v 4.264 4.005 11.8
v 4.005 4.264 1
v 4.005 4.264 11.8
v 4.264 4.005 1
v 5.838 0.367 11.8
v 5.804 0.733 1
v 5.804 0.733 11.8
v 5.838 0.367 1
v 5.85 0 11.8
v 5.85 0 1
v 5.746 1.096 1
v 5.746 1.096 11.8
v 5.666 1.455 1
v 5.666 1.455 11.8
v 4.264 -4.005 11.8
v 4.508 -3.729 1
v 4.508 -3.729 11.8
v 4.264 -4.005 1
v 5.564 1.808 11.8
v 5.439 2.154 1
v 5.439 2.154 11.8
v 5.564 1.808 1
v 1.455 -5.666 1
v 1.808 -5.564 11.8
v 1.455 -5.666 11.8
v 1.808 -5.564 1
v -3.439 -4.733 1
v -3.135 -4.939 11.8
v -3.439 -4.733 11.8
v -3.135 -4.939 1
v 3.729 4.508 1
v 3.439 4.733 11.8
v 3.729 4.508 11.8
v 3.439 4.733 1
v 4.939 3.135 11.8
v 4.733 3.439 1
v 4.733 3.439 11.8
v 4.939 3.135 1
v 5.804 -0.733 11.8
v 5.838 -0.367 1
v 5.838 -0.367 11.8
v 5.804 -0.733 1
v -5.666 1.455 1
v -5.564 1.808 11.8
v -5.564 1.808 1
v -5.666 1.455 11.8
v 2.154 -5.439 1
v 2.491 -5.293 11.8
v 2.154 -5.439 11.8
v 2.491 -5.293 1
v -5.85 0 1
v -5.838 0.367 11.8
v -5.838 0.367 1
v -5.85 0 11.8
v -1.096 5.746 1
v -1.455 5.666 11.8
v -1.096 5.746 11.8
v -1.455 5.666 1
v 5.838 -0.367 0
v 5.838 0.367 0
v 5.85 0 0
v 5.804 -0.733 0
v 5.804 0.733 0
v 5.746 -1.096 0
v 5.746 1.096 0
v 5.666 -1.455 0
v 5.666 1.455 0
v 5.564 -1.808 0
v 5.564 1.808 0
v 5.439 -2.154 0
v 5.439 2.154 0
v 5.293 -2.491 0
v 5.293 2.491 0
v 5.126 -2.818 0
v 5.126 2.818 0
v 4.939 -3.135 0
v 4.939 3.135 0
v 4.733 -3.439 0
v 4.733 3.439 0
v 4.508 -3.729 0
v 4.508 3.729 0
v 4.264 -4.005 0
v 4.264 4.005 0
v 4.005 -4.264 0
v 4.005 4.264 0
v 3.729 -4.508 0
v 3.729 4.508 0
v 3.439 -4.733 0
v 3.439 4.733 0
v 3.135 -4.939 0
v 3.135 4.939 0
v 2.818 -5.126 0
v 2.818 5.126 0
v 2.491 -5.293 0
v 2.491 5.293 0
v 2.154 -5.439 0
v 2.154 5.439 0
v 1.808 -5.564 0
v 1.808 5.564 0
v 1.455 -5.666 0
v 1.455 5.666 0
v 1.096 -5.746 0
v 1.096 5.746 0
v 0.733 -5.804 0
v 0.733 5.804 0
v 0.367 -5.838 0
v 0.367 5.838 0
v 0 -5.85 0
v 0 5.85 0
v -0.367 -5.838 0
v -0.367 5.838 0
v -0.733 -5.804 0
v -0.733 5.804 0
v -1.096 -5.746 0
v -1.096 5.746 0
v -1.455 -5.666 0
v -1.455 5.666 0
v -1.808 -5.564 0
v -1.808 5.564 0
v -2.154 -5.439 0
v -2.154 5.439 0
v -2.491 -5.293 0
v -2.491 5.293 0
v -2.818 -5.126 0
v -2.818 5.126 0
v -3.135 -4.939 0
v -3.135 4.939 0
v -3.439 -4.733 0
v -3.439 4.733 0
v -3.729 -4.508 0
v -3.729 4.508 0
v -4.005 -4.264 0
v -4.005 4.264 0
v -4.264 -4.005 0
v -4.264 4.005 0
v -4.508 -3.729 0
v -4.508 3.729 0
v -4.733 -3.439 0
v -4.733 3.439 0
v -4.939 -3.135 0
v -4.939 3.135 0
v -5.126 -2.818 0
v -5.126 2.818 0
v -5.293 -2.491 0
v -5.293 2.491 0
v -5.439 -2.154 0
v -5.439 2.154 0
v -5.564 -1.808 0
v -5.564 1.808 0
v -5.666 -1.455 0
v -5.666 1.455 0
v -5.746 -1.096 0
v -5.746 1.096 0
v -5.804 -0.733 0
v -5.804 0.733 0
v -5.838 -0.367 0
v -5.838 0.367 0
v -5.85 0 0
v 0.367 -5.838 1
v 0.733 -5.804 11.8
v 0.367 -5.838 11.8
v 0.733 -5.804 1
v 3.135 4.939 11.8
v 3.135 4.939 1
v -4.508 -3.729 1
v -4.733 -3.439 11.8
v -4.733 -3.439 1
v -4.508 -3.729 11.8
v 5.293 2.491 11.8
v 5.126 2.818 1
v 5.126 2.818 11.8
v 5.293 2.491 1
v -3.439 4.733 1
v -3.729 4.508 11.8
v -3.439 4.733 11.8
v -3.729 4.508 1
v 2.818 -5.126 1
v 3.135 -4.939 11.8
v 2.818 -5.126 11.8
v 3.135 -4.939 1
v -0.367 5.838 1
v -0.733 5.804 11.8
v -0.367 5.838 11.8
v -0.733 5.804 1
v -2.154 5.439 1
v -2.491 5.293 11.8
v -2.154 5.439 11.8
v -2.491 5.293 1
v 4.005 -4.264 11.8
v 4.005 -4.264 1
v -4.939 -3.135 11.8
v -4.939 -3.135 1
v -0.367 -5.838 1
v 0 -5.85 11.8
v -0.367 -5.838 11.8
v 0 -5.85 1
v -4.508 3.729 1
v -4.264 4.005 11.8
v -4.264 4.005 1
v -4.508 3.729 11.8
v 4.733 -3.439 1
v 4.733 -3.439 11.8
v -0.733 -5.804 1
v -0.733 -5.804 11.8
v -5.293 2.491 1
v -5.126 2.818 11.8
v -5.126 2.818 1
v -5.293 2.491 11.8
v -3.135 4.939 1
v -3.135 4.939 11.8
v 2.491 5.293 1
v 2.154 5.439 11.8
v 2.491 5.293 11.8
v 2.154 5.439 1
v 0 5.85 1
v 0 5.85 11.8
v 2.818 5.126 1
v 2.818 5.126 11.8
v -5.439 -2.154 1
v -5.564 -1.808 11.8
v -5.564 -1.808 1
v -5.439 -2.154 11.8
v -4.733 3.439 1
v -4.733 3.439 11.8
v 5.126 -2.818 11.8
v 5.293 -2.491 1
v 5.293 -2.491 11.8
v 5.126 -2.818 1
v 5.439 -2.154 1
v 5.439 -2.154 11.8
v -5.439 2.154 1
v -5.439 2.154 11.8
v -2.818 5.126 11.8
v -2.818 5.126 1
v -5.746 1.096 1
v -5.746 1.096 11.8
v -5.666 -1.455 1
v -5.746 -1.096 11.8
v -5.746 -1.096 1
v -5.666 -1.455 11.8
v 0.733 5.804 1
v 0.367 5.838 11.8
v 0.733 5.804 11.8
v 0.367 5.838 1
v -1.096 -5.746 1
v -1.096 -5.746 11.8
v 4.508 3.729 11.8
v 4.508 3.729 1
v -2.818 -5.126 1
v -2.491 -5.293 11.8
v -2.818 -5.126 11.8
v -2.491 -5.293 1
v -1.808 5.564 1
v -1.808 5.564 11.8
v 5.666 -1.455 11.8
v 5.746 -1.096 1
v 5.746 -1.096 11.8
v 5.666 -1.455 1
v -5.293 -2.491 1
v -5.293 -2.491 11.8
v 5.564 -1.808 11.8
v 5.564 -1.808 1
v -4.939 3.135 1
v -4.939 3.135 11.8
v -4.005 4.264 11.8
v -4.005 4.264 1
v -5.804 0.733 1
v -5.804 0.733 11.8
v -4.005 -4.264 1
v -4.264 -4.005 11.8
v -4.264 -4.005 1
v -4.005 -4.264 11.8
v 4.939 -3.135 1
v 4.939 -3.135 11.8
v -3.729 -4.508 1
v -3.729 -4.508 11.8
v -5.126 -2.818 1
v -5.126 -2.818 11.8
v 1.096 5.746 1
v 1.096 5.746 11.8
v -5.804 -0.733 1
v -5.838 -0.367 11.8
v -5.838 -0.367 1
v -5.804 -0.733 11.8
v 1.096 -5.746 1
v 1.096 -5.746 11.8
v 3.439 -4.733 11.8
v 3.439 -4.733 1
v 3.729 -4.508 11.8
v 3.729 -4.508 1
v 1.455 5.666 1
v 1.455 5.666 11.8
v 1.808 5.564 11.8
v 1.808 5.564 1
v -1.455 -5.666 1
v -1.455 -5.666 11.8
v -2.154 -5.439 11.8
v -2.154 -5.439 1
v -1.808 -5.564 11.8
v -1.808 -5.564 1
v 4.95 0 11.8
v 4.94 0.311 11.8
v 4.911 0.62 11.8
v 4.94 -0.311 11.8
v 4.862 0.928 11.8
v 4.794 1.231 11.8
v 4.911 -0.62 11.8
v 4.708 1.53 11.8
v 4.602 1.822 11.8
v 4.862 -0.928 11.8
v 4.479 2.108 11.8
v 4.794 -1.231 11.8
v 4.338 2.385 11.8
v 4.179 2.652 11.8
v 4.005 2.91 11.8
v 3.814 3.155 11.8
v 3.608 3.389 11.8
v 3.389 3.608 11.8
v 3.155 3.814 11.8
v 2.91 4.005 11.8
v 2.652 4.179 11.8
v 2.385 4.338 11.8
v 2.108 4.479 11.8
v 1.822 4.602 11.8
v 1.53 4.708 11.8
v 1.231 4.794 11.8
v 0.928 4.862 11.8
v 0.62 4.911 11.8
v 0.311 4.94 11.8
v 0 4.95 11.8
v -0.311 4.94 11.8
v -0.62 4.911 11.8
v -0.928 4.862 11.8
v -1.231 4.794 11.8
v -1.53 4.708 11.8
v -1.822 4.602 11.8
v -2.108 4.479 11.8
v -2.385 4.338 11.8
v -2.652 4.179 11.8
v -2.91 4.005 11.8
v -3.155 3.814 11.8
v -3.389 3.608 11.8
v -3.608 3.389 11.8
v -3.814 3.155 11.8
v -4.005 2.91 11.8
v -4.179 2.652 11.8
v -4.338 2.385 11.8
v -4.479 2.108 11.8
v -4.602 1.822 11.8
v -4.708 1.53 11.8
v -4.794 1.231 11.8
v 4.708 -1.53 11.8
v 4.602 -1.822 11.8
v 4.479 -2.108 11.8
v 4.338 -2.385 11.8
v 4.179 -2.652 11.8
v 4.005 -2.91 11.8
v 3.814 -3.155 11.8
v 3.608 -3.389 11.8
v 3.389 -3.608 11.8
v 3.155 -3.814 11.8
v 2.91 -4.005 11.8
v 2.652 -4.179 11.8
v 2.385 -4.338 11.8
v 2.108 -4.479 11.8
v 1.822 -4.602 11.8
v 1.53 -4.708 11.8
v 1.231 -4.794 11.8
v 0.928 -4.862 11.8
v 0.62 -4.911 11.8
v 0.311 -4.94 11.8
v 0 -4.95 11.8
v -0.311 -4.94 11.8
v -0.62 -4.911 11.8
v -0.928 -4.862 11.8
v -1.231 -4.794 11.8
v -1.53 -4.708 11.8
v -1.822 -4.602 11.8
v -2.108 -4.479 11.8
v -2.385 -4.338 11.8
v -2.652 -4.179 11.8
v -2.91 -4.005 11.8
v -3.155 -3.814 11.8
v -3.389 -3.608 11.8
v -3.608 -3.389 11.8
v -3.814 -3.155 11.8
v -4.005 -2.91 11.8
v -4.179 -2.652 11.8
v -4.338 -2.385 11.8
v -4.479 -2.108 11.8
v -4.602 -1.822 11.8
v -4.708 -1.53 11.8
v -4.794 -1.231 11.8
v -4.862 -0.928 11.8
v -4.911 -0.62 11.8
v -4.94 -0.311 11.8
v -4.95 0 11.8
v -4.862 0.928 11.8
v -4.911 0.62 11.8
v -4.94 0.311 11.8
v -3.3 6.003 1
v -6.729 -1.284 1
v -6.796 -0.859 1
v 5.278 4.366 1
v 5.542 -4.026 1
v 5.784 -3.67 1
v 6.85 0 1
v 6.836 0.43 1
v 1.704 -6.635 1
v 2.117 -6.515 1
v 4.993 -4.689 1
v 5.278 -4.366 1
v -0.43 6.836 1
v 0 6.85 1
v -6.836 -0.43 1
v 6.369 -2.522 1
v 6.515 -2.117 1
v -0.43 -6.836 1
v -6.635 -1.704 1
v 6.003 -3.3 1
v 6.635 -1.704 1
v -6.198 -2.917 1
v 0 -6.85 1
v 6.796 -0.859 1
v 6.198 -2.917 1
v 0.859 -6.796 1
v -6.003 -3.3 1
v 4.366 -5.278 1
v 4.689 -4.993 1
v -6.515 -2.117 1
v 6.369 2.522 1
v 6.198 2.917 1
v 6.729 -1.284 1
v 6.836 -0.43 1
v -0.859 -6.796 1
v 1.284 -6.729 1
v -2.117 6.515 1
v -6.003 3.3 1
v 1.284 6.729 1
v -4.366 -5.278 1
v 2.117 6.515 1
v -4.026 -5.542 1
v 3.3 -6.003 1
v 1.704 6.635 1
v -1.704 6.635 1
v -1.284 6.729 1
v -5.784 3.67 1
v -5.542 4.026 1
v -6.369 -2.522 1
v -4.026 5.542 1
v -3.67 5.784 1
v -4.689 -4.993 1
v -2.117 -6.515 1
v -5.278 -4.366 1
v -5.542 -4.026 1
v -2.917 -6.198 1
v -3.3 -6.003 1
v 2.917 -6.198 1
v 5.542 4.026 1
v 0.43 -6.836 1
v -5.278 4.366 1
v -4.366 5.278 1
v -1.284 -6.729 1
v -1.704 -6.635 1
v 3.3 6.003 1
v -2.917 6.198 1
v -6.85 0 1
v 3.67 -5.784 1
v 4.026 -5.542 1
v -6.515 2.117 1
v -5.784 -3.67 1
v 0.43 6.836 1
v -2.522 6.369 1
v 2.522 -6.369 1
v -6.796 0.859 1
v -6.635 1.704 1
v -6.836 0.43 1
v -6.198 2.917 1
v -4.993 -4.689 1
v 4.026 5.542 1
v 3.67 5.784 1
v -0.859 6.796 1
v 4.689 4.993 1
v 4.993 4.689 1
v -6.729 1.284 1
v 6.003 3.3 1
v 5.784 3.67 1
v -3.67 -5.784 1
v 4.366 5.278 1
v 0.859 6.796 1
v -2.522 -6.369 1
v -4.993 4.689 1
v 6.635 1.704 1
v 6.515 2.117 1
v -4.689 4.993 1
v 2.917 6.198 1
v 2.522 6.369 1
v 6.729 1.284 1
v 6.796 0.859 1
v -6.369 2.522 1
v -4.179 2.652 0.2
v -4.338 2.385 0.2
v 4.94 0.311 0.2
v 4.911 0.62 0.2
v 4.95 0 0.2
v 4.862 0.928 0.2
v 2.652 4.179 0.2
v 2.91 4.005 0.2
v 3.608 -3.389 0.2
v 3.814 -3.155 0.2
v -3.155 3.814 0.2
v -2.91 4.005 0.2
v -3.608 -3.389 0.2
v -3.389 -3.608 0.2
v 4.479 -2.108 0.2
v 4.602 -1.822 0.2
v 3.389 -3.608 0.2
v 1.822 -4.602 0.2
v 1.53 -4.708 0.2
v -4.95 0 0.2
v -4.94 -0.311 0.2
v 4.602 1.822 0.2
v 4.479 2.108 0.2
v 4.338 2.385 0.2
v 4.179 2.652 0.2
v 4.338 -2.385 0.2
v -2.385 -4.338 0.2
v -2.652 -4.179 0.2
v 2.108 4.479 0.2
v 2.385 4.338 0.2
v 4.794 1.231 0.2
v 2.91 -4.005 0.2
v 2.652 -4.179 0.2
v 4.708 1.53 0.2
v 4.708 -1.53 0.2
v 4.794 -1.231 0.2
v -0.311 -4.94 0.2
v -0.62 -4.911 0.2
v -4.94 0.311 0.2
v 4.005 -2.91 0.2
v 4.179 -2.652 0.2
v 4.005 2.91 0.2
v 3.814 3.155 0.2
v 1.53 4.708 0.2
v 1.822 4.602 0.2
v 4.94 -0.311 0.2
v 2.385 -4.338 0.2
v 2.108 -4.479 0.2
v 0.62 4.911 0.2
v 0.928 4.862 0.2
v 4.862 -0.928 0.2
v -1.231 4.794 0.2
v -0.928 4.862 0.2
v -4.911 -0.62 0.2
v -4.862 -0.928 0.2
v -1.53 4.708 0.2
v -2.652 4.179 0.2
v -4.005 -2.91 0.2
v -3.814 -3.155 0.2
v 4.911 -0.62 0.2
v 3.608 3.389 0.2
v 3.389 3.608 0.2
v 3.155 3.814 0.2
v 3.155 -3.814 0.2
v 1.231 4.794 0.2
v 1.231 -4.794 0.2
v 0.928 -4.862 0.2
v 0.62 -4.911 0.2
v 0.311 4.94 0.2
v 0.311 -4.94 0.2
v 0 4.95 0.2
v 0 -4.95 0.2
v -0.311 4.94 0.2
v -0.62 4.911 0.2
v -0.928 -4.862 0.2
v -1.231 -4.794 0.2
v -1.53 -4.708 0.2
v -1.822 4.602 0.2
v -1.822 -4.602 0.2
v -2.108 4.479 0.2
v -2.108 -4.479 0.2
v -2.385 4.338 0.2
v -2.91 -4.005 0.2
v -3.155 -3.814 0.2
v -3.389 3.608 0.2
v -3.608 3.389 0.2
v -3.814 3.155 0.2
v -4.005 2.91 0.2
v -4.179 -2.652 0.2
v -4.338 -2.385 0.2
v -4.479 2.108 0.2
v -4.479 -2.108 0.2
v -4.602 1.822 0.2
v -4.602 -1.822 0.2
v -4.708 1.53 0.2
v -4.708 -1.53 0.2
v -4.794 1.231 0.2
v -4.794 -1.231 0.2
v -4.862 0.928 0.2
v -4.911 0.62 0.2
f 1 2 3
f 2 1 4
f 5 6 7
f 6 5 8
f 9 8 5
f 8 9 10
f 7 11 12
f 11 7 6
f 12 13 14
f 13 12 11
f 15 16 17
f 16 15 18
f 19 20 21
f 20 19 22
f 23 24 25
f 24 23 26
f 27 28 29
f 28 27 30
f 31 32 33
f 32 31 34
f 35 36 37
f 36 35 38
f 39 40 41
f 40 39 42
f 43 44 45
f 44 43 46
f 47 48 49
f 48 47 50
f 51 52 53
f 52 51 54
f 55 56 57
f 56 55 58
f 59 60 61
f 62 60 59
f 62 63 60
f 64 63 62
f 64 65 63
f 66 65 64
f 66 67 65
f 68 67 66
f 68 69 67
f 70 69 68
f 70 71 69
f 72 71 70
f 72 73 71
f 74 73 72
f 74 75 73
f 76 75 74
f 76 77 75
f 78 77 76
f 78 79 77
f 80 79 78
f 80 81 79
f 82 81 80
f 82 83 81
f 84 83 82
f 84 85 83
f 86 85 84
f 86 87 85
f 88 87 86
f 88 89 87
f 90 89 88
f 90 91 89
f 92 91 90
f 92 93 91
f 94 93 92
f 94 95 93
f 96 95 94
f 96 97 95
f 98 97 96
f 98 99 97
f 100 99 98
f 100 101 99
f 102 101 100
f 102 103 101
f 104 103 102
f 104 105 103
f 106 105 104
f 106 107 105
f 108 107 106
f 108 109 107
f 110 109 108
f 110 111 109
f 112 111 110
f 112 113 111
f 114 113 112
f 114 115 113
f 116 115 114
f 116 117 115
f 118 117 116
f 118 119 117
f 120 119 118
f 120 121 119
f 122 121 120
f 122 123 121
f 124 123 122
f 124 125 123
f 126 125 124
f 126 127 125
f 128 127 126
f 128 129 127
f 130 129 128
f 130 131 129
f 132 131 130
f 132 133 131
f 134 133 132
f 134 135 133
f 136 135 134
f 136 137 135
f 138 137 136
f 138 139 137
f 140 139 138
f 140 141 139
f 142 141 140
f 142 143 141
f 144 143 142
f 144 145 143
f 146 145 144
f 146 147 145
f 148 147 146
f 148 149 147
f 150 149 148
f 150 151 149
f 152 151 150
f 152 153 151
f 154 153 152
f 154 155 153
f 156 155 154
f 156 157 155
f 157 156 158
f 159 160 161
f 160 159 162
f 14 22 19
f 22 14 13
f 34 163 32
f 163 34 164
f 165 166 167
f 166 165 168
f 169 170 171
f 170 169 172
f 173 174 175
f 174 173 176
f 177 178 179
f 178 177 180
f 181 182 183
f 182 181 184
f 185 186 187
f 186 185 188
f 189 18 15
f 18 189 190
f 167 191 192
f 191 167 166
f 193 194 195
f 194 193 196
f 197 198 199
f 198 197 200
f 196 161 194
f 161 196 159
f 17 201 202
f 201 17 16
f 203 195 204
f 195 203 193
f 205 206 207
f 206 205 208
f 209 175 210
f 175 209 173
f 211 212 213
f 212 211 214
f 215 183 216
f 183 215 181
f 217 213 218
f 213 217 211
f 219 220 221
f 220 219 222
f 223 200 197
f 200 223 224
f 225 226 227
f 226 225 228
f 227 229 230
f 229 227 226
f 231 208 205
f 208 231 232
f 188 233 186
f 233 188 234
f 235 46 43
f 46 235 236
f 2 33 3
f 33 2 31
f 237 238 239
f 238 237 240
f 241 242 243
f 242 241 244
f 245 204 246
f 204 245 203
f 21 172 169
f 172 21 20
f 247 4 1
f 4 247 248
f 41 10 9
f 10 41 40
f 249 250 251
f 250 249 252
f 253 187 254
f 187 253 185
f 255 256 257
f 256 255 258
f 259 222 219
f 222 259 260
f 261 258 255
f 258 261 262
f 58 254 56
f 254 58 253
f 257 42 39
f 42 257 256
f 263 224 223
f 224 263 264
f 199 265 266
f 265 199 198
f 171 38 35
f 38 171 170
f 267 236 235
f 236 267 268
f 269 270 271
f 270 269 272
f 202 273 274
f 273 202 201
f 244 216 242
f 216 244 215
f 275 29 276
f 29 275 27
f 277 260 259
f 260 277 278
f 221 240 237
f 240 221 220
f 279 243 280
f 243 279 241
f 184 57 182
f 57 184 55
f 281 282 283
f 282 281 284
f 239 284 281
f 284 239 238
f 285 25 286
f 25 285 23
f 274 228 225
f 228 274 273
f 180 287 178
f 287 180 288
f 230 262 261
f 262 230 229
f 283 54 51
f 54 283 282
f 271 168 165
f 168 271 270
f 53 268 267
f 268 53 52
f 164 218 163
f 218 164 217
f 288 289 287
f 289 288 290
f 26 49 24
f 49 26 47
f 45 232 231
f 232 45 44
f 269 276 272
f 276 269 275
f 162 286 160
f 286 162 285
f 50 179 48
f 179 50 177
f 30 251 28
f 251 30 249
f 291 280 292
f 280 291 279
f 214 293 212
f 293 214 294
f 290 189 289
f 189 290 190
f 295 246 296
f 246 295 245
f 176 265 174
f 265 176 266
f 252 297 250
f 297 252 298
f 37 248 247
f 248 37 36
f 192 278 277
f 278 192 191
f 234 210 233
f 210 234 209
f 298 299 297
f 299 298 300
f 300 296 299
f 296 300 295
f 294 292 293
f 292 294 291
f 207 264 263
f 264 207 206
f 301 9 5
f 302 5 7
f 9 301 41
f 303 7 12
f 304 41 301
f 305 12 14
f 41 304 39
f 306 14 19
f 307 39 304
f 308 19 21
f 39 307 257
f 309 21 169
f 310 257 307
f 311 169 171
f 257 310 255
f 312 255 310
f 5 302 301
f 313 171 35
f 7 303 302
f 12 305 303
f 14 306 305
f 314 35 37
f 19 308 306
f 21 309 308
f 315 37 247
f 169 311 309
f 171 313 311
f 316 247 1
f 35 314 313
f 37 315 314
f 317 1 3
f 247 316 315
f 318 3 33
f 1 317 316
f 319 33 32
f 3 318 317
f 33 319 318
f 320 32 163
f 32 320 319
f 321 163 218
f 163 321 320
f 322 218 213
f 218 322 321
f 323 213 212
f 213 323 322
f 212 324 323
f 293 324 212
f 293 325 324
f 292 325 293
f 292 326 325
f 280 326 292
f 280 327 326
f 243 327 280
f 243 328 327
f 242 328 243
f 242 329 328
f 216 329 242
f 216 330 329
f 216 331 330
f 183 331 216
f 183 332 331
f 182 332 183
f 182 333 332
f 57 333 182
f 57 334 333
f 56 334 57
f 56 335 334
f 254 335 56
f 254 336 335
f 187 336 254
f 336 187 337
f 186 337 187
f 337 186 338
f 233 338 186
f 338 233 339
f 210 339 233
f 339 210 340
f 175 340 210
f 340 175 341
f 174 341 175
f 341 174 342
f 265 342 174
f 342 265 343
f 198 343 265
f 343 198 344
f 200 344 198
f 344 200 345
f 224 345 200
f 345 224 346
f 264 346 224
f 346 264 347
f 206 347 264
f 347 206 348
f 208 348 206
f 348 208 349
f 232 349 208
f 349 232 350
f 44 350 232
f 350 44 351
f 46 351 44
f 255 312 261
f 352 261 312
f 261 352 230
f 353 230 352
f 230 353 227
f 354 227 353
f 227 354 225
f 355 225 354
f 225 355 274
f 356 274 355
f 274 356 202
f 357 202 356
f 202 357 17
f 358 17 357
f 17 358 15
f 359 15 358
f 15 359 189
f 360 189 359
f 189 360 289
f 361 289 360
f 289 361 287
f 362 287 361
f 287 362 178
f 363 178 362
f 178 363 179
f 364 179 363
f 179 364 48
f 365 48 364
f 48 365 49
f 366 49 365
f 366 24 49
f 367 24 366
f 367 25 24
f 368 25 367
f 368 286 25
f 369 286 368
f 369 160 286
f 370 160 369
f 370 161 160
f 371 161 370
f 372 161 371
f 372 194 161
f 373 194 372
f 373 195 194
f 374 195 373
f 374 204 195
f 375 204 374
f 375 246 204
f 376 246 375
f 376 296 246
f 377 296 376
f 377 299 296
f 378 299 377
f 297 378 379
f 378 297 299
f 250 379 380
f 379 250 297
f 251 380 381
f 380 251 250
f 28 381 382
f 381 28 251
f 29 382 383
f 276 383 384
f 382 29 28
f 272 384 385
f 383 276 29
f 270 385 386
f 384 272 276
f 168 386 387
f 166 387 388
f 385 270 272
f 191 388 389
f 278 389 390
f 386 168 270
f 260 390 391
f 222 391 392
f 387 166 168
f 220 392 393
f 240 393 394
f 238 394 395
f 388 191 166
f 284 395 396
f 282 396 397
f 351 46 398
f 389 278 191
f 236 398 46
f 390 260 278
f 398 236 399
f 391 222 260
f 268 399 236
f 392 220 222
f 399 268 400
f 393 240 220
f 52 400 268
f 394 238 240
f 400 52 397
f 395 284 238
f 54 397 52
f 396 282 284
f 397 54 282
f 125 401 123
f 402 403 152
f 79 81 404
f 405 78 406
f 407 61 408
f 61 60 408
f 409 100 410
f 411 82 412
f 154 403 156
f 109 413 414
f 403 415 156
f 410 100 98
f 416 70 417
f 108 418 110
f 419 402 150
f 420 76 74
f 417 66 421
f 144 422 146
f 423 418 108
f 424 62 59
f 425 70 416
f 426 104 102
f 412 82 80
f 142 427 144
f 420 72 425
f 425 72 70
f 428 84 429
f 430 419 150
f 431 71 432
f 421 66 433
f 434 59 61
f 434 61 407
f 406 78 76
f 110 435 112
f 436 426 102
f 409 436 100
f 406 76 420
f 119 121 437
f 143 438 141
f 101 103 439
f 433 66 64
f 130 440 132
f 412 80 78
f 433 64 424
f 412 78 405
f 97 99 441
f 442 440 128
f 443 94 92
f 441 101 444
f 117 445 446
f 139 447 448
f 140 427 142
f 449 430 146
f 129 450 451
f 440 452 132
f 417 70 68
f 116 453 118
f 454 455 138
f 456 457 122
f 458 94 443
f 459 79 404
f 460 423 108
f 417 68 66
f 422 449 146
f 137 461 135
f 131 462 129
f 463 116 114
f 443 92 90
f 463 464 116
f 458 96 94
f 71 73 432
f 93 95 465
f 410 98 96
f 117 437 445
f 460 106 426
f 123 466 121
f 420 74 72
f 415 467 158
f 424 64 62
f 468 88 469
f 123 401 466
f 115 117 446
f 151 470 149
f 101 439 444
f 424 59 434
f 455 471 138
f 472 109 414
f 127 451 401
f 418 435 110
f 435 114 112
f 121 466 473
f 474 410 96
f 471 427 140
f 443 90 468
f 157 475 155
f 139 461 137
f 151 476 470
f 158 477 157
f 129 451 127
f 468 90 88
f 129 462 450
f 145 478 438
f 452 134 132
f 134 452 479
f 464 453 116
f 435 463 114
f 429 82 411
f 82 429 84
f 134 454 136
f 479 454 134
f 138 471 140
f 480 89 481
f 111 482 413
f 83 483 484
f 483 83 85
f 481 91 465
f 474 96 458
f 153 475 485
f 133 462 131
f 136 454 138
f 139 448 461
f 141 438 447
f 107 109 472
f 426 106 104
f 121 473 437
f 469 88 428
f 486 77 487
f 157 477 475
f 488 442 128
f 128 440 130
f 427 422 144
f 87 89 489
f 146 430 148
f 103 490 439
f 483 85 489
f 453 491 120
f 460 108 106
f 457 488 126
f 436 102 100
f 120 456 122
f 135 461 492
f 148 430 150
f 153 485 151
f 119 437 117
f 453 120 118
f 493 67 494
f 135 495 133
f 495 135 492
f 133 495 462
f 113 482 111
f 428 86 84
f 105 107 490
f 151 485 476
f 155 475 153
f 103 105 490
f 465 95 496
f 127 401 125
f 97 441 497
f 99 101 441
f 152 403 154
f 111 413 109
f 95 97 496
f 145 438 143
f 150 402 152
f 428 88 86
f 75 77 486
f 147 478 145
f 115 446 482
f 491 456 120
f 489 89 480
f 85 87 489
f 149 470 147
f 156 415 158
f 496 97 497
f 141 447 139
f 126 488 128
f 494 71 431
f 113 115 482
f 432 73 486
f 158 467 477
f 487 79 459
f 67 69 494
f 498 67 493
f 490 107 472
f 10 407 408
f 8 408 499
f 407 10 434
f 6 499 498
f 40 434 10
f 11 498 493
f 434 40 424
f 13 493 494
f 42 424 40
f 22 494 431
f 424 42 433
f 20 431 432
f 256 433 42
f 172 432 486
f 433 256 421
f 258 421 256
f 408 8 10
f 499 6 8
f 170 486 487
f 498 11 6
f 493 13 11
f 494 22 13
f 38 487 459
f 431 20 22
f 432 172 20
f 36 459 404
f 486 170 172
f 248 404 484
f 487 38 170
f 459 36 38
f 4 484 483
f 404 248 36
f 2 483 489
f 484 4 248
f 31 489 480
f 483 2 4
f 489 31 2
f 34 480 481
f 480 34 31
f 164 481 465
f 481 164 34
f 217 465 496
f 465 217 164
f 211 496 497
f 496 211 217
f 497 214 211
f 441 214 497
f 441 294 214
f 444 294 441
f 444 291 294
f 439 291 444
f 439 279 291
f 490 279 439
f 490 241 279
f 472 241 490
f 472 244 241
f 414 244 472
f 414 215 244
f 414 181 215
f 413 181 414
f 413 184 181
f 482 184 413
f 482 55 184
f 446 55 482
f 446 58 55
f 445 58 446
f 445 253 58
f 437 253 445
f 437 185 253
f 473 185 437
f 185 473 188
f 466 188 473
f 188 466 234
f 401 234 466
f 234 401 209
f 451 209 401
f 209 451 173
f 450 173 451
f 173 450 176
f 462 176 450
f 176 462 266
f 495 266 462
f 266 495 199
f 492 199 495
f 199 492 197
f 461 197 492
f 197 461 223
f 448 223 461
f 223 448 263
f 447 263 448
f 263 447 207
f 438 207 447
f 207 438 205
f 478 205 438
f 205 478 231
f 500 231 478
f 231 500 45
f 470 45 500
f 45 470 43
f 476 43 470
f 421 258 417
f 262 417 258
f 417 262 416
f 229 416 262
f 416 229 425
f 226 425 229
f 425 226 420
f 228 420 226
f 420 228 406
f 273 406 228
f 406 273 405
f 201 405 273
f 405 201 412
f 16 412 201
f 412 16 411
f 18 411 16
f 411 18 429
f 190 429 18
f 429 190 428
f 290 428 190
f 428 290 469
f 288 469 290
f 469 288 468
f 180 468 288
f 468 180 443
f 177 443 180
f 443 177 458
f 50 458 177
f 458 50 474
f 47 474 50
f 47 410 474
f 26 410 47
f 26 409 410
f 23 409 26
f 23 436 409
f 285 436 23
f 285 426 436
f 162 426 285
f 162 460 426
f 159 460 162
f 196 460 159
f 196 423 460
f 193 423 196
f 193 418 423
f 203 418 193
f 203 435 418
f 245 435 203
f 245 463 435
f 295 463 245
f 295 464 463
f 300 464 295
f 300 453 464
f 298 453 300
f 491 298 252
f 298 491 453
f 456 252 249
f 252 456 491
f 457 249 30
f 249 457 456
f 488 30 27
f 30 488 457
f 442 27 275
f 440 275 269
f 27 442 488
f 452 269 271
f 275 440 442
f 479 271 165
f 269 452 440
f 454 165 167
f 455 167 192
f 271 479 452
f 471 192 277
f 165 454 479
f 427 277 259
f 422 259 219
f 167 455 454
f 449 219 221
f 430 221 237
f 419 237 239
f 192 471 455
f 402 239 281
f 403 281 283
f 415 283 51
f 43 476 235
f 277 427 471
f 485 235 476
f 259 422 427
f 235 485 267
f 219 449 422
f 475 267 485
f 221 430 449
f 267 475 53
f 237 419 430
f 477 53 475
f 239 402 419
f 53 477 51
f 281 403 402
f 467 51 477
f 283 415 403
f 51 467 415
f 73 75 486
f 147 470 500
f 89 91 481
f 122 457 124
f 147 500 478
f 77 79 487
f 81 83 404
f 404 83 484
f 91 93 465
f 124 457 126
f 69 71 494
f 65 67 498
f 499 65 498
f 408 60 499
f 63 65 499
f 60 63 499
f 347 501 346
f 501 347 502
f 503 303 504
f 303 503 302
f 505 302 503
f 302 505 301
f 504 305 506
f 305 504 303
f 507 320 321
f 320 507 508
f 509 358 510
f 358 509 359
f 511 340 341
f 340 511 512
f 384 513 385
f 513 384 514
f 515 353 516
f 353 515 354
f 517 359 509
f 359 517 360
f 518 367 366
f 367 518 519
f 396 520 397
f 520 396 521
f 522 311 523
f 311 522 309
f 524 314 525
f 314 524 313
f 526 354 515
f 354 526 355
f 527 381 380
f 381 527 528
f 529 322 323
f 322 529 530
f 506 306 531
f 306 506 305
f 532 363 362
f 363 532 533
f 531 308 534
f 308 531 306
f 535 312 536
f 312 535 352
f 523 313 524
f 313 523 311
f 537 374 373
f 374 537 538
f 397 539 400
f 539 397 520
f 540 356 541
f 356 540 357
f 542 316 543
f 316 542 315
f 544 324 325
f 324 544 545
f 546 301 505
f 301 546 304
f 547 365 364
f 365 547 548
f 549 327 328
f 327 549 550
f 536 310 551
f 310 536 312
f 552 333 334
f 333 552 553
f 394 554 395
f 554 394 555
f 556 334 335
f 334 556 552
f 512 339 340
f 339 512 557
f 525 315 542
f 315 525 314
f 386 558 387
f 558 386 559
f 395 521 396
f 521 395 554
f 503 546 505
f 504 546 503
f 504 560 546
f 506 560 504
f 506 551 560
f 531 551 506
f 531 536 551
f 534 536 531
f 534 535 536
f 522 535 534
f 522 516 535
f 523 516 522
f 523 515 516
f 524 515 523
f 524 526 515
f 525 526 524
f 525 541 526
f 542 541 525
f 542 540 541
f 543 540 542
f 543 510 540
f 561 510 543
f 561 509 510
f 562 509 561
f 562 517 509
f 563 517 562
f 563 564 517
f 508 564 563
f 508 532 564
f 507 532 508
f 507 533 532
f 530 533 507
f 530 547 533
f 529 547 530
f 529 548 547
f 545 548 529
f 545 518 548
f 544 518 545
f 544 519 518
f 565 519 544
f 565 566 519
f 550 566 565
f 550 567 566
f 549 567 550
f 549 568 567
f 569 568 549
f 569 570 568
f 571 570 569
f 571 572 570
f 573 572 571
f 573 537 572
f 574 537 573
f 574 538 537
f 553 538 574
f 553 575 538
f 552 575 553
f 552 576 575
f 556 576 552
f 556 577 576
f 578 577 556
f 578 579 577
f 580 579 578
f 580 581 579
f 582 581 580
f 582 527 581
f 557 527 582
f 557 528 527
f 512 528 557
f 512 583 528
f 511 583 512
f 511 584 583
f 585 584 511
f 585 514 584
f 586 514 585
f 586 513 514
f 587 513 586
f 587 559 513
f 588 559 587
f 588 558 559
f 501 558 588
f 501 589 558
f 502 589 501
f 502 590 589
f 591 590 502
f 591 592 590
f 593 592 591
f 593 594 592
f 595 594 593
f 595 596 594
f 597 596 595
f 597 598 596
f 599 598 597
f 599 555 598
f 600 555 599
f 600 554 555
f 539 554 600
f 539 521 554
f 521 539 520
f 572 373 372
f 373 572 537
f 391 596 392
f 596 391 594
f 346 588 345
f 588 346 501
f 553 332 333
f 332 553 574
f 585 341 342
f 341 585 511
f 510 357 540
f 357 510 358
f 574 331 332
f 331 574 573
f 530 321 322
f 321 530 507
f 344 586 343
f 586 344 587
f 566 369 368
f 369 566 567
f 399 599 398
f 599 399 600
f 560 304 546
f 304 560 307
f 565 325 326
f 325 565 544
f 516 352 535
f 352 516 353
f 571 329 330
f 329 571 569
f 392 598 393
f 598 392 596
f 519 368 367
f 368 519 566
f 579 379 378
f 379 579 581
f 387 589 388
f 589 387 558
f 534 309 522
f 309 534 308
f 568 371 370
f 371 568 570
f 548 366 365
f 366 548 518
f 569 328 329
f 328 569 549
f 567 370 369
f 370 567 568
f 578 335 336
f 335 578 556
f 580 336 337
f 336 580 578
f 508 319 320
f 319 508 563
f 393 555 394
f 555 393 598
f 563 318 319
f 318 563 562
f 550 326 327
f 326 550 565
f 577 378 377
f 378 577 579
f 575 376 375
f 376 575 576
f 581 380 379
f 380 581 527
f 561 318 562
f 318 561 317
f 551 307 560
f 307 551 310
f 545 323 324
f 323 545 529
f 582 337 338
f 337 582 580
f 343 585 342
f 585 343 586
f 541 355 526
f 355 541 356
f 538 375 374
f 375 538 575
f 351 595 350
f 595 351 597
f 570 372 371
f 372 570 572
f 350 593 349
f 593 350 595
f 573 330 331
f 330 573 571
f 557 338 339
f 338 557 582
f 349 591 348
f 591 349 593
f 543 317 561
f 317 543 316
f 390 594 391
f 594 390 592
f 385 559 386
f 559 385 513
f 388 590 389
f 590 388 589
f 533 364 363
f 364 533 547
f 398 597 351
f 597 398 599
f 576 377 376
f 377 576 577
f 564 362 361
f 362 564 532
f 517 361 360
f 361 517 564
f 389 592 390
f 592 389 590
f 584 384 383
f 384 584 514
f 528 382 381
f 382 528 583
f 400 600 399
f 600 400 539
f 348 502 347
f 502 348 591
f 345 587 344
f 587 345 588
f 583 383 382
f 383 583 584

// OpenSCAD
// file: door-servo-measurements.scad
//boxSize=[640, 300, 500];
boxSize=[280, 150, 220];
boxWallThickness=4;

perspexBorderSize=8;

doorWoodBorder=10;
doorWoodHingeBorder=50;
doorWoodBorderRadius=2;
doorWoodThickness=16;
acsButtonM=20.2;
acsLargeModuleSize=[50.12, 65.47];
acsNfcModuleSize=[40,40];
acsModuleBorder=0.1;
acsLidWidth=110;

nfcLogoSize=[28.753704,28.782331];

strokeSize=20;
clipSize=20;
clipWall=5;
doorWall=3;
doorClipGap=3;
boltM=3;
smallBoltM=2;
boltHeadM=5;
boltNutM=5.9;
boltHeadHeight=3;
lockBoltCurveR=1.5;

cabinetHingeDoorBoltOffsetHeight=48/2;
cabinetHingeDoorBoltOffsetLength=7;
cabinetHingeDoorMetalThickness=0.8;
cabinetHingeDoorInsetM=35;
cabinetHingeDoorInsetDepth=12;
cabinetHingeDoorInsetFace=2.5;
cabinetHingeDoorInsetWidth=25.5;
cabinetHingeDoorInsetLengthOffset=3;
cabinetHingeDoorInsetOuterRadius=4;
cabinetHingeDoorBoltChamferM=8;

cabinetHingeFrameBoltOffsetHeight=16;
cabinetHingeFrameBoltOffsetDepth=25;
cabinetHingeFrameSize=[27,46, 16];
cabinetHingeFrameInsetFace = 2.8;
cabinetHingeFrameCornerRadius = 4;
cabinetHingeFrameHoleOne=6;
cabinetHingeFrameHoleTwoExtraOffset = 14;
cabinetHingeFrameHoleTwo=cabinetHingeFrameHoleOne + cabinetHingeFrameHoleTwoExtraOffset;
cabinetHingeFrameLargeChamferSize=[8,12];

cabinetHingeDoorPlate=[19.3,60];

boltPlate = boltM * 3;

gapToMove = 0.25;
gapToFit = 0.1;
doorSize=[200,150];
doorLatchPannel=3 * boltM;

servoHeight = 22.5;
servoDrivePlateHeight = 4;
servoSpindleHeight = 3;
servoSpindleOffset = 5.5;
servoWidth = 12.2;
servoLength = 23;
servoArmM=10;
servoSpindleM=4.8;

servoMountPlateLength=32.2;
servoMountPlateOffset=16.75;
servoMountPlateThickness=2;
servoMountPlateExtends = (servoMountPlateLength - servoLength) / 2;
servoMountHoleOffset = 2;
servoMountHoleM = 2;

switchThickness = 9.7;
switchCornerR=4;
switchHoleM=3;
switchLength=27.9;
switchWidth=15.96;
switchRollerOut=9;
switchRollerIn=6.5;
switchRollerM=4.6;
switchRollerTopOffset=3.3;
switchRollerThickness = switchThickness - 2 * 2.5;

leaverSwitchThickness=6.36;
leaverSwitchWidth=9.92;
leaverSwitchLength=20.15;
leaverSwitchCornerR=1;
leaverOffset=3;
leaverExtension=11.5;
leaverThickness = 1;
leaverWidth=4.28;
leaverSwitchContactLength=5;
leaverSwitchContactOffset=1.5;

thinWall=1;
ferrousSheet=1;
magnetM=5;

initialAngle = 20;
deltaAngle = 66.5;

bleepHolesOffset=110-56;

handleDepth=45;
handleWall=2;
// file: ../mill/bleep-holes-measurements.scad
bleepLedCapM=6.4/2;
bleepButtonM=20.2/2;
bleepIndicatorM=11.8/2;
// main file
include <../mill/bleep-holes-measurements.scad>
include <door-servo-measurements.scad>

ledId=10;
ledOd=(bleepIndicatorM) * 2;
transparentWall=0.2;
ledHeight=11.6;
outerRing=1;
$fn=100;

difference() {
    union() {
        cylinder(r=(ledOd-gapToFit) / 2,h=ledHeight + transparentWall);
        cylinder(r1=(ledOd-gapToFit) / 2,r2=outerRing + (ledOd-gapToFit) / 2,h=thinWall);
    }
    translate([0,0,transparentWall]) {
        cylinder(r=(ledId - gapToFit) / 2, h=ledHeight + 0.01);
    }
}
